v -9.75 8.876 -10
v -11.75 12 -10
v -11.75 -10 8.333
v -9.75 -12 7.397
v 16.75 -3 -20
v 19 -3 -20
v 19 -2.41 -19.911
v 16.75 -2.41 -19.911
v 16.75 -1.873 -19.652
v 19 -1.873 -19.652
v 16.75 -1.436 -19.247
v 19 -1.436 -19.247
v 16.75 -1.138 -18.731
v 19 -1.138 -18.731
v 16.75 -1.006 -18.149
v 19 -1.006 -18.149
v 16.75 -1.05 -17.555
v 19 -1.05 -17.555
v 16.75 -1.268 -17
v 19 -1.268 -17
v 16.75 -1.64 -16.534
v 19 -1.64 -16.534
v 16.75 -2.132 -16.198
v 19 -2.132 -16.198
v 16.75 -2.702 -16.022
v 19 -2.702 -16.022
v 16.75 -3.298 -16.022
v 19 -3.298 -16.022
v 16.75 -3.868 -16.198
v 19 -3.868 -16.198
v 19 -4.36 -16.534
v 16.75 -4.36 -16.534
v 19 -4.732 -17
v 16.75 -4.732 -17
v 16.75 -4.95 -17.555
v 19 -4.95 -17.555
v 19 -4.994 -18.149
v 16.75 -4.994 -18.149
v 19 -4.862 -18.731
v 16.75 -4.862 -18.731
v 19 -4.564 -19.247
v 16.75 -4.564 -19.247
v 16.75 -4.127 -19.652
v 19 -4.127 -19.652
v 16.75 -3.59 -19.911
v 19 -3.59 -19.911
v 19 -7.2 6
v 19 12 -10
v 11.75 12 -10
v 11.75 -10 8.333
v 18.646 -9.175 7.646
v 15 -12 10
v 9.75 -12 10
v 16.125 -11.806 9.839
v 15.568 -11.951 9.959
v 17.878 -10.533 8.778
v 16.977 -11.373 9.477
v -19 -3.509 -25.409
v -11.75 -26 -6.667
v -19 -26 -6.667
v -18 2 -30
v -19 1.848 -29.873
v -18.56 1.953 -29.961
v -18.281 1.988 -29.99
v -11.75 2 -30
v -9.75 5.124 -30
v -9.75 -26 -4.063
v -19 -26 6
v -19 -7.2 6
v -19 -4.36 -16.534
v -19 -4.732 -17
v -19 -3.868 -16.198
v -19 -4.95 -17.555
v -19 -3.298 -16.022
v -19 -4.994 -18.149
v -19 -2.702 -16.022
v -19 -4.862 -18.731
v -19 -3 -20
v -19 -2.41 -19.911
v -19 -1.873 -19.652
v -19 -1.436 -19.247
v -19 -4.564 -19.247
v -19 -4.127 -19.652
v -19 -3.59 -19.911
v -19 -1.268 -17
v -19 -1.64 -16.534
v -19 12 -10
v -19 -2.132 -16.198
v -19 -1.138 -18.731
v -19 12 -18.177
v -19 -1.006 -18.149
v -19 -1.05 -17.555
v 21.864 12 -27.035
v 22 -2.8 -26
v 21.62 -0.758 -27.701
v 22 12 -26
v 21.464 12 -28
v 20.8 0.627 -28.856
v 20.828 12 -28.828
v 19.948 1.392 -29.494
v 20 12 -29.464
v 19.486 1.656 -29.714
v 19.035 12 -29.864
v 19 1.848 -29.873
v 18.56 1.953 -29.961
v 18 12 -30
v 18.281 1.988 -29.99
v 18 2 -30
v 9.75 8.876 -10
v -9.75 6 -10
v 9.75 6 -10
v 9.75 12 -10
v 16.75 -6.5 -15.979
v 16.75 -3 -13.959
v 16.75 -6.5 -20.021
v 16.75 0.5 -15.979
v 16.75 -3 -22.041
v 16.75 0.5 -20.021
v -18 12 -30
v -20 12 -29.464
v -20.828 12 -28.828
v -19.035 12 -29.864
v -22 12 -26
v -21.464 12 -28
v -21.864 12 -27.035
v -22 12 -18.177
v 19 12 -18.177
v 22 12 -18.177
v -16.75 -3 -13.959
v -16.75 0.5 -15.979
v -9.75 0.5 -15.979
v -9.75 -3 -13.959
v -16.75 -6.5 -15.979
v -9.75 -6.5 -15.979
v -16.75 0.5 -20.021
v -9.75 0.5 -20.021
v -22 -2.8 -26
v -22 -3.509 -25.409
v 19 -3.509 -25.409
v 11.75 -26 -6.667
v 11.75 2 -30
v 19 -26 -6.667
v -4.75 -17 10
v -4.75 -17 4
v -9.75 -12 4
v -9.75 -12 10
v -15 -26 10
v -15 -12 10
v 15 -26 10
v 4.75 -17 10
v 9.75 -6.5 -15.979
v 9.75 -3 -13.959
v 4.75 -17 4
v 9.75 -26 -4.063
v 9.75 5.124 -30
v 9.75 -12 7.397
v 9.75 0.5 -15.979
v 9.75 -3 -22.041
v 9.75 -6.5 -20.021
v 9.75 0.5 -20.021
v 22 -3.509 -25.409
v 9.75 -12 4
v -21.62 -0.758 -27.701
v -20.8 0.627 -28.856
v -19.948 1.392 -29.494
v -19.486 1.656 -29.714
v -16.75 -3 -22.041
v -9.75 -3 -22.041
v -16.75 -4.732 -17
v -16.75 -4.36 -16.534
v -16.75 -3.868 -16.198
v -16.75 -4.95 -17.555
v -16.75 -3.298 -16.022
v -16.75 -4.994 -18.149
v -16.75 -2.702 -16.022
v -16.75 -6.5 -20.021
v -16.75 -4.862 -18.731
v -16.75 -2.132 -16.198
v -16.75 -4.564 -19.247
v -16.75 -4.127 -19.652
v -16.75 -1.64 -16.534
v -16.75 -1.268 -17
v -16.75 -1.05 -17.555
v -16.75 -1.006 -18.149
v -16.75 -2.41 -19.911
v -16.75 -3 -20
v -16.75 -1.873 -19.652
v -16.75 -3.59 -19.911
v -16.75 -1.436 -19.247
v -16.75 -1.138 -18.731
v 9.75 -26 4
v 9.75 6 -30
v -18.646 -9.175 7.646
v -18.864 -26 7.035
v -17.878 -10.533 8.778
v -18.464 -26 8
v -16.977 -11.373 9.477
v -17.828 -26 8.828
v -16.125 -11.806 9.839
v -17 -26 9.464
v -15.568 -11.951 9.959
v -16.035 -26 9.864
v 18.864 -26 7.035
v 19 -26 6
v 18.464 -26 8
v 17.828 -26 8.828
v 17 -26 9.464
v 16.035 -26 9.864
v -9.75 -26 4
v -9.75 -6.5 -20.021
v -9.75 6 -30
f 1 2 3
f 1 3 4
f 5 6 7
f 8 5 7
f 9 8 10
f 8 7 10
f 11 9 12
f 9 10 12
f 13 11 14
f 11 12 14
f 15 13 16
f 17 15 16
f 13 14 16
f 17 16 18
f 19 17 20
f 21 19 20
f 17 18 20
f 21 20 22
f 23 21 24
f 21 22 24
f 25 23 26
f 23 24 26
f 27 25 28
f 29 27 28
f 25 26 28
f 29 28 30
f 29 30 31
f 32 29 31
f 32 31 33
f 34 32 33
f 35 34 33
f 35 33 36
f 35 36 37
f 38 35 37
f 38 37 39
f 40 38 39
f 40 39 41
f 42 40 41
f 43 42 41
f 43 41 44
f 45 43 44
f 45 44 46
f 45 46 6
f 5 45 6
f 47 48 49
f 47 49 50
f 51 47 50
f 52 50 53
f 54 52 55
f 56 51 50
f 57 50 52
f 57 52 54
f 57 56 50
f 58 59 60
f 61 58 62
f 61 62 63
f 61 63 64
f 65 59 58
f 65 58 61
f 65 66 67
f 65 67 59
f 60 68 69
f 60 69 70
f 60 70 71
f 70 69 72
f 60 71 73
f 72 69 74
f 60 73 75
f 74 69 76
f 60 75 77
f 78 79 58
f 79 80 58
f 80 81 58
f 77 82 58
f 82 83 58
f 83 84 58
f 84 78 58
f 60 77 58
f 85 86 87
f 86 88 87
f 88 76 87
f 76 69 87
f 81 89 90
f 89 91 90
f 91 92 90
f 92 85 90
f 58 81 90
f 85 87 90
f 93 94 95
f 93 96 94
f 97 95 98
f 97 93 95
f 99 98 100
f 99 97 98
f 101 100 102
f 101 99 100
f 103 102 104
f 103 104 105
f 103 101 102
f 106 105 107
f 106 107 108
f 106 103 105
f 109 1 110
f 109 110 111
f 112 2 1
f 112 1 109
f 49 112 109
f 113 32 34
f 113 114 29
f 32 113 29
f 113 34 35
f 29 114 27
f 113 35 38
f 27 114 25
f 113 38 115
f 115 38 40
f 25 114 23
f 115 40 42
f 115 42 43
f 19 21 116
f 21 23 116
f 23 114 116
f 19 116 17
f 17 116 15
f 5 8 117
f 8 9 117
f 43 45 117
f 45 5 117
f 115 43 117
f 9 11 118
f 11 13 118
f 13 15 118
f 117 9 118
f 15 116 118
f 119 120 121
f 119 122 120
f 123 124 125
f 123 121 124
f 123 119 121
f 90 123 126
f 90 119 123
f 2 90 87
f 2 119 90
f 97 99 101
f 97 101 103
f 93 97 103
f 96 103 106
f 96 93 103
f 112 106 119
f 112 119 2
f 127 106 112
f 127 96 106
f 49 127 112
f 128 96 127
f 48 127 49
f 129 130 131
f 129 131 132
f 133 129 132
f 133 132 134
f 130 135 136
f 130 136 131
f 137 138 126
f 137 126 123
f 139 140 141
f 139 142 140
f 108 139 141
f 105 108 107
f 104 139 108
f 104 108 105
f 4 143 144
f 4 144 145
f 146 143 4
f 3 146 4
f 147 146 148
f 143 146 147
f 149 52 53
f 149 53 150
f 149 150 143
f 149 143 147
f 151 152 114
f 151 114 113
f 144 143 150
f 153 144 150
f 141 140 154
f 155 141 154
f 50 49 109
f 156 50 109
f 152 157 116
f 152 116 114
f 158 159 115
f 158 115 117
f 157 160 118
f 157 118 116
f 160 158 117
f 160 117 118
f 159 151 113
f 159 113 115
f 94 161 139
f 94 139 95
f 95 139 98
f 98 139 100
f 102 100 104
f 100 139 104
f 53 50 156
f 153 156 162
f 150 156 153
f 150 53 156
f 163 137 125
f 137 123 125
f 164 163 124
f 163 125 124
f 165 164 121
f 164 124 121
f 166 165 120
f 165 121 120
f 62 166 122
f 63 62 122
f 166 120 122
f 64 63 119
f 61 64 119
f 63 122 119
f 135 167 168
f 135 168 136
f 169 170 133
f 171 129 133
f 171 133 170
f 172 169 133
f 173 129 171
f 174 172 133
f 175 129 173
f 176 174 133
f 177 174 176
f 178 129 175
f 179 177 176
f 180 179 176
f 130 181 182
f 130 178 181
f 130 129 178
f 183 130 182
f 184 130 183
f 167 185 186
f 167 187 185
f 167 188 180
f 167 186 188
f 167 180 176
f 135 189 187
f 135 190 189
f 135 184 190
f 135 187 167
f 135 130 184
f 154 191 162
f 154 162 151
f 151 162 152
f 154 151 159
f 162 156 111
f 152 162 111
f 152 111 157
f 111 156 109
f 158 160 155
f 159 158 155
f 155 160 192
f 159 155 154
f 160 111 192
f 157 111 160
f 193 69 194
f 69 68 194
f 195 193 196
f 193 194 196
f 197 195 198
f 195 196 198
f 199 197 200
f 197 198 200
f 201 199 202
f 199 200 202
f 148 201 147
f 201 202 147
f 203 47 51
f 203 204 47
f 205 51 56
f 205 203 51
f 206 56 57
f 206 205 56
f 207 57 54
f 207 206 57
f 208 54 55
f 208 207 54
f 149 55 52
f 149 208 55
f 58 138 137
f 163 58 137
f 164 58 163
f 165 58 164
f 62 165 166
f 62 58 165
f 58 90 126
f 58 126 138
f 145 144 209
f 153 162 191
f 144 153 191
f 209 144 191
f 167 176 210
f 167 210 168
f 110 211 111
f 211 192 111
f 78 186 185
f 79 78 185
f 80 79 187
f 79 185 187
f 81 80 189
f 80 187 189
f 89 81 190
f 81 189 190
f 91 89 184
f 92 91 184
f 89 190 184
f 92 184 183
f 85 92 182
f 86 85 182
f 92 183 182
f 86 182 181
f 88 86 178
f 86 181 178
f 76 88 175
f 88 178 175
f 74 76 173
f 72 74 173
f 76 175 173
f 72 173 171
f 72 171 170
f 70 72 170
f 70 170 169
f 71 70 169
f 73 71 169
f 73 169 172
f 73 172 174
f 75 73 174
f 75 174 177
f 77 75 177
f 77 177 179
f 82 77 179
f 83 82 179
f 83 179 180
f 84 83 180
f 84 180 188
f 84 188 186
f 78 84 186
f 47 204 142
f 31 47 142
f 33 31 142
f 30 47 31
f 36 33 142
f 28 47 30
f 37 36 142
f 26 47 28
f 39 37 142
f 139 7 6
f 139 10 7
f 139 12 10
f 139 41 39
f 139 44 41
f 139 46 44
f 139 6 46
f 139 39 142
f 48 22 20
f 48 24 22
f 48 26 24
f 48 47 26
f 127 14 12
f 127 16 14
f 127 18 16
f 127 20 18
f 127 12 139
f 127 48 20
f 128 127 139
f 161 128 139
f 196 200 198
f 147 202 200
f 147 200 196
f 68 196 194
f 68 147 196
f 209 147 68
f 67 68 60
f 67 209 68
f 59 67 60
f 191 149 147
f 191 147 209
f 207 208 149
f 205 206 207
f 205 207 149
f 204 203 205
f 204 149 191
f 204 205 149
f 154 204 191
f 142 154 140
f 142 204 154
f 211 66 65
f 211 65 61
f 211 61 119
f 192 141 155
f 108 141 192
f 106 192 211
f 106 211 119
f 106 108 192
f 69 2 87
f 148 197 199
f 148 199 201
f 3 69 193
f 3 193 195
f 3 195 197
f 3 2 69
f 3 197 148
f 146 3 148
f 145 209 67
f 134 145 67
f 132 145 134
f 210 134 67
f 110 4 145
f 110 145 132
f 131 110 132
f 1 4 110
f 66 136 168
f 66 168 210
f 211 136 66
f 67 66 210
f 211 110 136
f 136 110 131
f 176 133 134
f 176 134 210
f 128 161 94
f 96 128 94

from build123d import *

# Parameters (mm, degrees)
BOSS_EXTRUDE1_DEPTH = 19
CUT_EXTRUDE1_DEPTH  = 9.75
SKETCH5_R           = 2
CUT_EXTRUDE3_DEPTH  = 55.954526656
BOSS_EXTRUDE3_DEPTH = 3
CUT_EXTRUDE4_DEPTH  = 53.535702146
CUT_EXTRUDE6_START  = -7
CUT_EXTRUDE6_DEPTH  = 33.5
FILLET1_R           = 4
CHAMFER2_SIZE       = 2


with BuildPart() as part:
    # Sketch1 → Boss-Extrude1 (new, symmetric)
    with BuildSketch(Plane(origin=(0, 0, 0), x_dir=(0, 0, -1), z_dir=(1, 0, 0))):
        Polygon((-10, -12), (-10, -26), (6.666666667, -26), (30, 2), (30, 12), (10, 12), align=None)
    extrude(amount=BOSS_EXTRUDE1_DEPTH, both=True)

    # Sketch2 → Cut-Extrude1 (cut, symmetric)
    with BuildSketch(Plane(origin=(0, 0, 0), x_dir=(0, 0, -1), z_dir=(1, 0, 0))):
        Polygon((30, 6), (10, 6), (10, 12), (-4, 12), (-4, 6), (-10, 6), (-10, -12), (-4, -12), (-4, -26), (30, -26), align=None)
    extrude(amount=CUT_EXTRUDE1_DEPTH, both=True, mode=Mode.SUBTRACT)

    # Sketch5 → Cut-Extrude3 (cut, through all)
    with BuildSketch(Plane(origin=(19, 0, 0), x_dir=(0, 0, -1), z_dir=(1, 0, 0))):
        with Locations((18, -3)):
            Circle(SKETCH5_R)
    extrude(amount=-CUT_EXTRUDE3_DEPTH, mode=Mode.SUBTRACT)

    # Sketch6 → Boss-Extrude3 (add)
    with BuildSketch(Plane(origin=(19, 0, 0), x_dir=(0, 0, -1), z_dir=(1, 0, 0))):
        Polygon((18.177341601, 12), (25.409256694, -3.508891967), (30, 2), (30, 12), align=None)
    boss_extrude3 = extrude(amount=BOSS_EXTRUDE3_DEPTH)

    # Sketch7 → Cut-Extrude4 (cut, through all)
    with BuildSketch(Plane.XY.offset(10)):
        Polygon((-9.75, -12), (-4.75, -17), (4.75, -17), (9.75, -12), align=None)
    extrude(amount=-CUT_EXTRUDE4_DEPTH, mode=Mode.SUBTRACT)

    # Mirror2: Boss-Extrude3 across plane
    add(boss_extrude3.mirror(Plane(origin=(0, 0, 0), x_dir=(0, 0, 1), z_dir=(1, 0, 0))))

    # Sketch9 → Cut-Extrude6 (cut)
    with BuildSketch(Plane(origin=(-9.75, 0, 0), x_dir=(0, 0, -1), z_dir=(1, 0, 0)).offset(CUT_EXTRUDE6_START)):
        Polygon((13.958548116, -3), (15.979274058, -6.5), (20.020725942, -6.5), (22.041451884, -3), (20.020725942, 0.5), (15.979274058, 0.5), align=None)
    extrude(amount=CUT_EXTRUDE6_DEPTH, mode=Mode.SUBTRACT)

    # Fillet1
    fillet1_edges = [part.edges().sort_by_distance(p)[0] for p in [
        (22, 7, -30),
        (19, -19, 10),
        (-19, -19, 10),
        (-22, 7, -30),
    ]]
    fillet(fillet1_edges, radius=FILLET1_R)

    # Chamfer2
    # the kernel refuses this chamfer: 2 mm, written as the material it takes off along each edge
    with BuildSketch(Plane(origin=(-9.75, -15.951243191, 13.29270266), x_dir=(-0.9996219169112968, 0.017602431261197007, 0.02112291751343641), z_dir=(0, 0.7682212795973759, -0.6401843996644799))) as chamfer2_piece_1_section:
        Polygon((CHAMFER2_SIZE * 0.999621916911, -CHAMFER2_SIZE * 0.0274958766106), (-CHAMFER2_SIZE * 0.0274958766106, -CHAMFER2_SIZE * 0.999621916911), (0, 0), align=None)
    chamfer2_piece_1 = extrude(amount=41.527730655, mode=Mode.PRIVATE)
    chamfer2_piece_1 = split(chamfer2_piece_1, bisect_by=Plane(origin=(-15.992155631, -5.757844369, -0.703880227), z_dir=(0.7071067811865478, 0.7071067811865474, 0)), keep=Keep.TOP, mode=Mode.PRIVATE)
    chamfer2_piece_1 = split(chamfer2_piece_1, bisect_by=Plane(origin=(-10.414483767, -0.180172505, -10), z_dir=(0, 0, 1)), keep=Keep.TOP, mode=Mode.PRIVATE)
    add(chamfer2_piece_1, mode=Mode.SUBTRACT)
    with BuildSketch(Plane(origin=(-9.75, -29.951243191, -3.373964007), x_dir=(0.02749587661058651, 0.639942356769315, 0.7679308281231783), z_dir=(0, 0.768221279597376, -0.6401843996644798))) as chamfer2_piece_2:
        Polygon((CHAMFER2_SIZE * 0.999621916911, -CHAMFER2_SIZE * 0.0274958766106), (-CHAMFER2_SIZE * 0.0274958766106, -CHAMFER2_SIZE * 0.999621916911), (0, 0), align=None)
    extrude(amount=46.734563773, mode=Mode.SUBTRACT)
    with BuildSketch(Plane(origin=(9.75, -15.951243191, 13.29270266), x_dir=(0.9996219169112968, 0.017602431261197007, 0.02112291751343641), z_dir=(0, 0.7682212795973759, -0.6401843996644799))) as chamfer2_piece_3_section:
        Polygon((CHAMFER2_SIZE * 0.999621916911, CHAMFER2_SIZE * 0.0274958766106), (-CHAMFER2_SIZE * 0.0274958766106, CHAMFER2_SIZE * 0.999621916911), (0, 0), align=None)
    chamfer2_piece_3 = extrude(amount=41.527730655, mode=Mode.PRIVATE)
    chamfer2_piece_3 = split(chamfer2_piece_3, bisect_by=Plane(origin=(15.992155631, -5.757844369, -0.703880227), z_dir=(-0.7071067811865477, 0.7071067811865475, 0)), keep=Keep.TOP, mode=Mode.PRIVATE)
    chamfer2_piece_3 = split(chamfer2_piece_3, bisect_by=Plane(origin=(10.414483767, -0.180172505, -10), z_dir=(0, 0, 1)), keep=Keep.TOP, mode=Mode.PRIVATE)
    add(chamfer2_piece_3, mode=Mode.SUBTRACT)
    with BuildSketch(Plane(origin=(9.75, 5.951243191, -33.29270266), x_dir=(0.9996219169112968, -0.017602431261197003, -0.02112291751343641), z_dir=(0, -0.768221279597376, 0.6401843996644798))) as chamfer2_piece_4:
        Polygon((CHAMFER2_SIZE * 0.999621916911, CHAMFER2_SIZE * 0.0274958766106), (-CHAMFER2_SIZE * 0.0274958766106, CHAMFER2_SIZE * 0.999621916911), (0, 0), align=None)
    extrude(amount=46.734563773, mode=Mode.SUBTRACT)


solid = part.part
